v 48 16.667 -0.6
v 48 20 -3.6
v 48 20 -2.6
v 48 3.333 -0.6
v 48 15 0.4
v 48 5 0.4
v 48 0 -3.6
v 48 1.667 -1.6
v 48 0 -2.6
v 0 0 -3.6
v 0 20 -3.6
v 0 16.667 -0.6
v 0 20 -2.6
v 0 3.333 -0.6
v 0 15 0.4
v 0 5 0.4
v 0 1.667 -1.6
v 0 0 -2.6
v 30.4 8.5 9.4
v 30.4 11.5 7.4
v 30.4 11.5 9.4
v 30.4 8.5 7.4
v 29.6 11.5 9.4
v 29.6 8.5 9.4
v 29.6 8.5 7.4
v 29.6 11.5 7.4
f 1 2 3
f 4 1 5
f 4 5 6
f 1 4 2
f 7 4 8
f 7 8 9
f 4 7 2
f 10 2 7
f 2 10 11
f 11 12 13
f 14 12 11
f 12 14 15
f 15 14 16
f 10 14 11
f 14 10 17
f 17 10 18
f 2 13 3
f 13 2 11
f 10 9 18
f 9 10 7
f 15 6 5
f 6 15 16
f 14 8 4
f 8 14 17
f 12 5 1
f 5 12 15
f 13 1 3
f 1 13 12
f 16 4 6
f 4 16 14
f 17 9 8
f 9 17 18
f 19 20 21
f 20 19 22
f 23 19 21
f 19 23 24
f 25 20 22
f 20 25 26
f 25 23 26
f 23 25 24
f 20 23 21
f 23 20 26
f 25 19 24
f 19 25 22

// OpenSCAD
union() {
translate([0,14,-.1]) intersection() {
	rotate([90,0,0]) linear_extrude(8) resize([48,0],auto=true) import ("/Users/rmd/Documents/Patrick.dxf");
	translate([24,-4,6]) linear_extrude(12,scale=[1,.25],center=true) square([48,8],center=true);
}
	translate([0,0,-3.6]) cube([48,20,1]);
//difference() {
	translate([0,10,-1.1])linear_extrude(3,scale=[1,.5],center=true) translate([0,-10]) square([48,20]);
	//translate([5.5,10,-10]) cylinder(r=3,h=10,$fn=20);
	//translate([17,10,-10]) cylinder(r=3,h=10,$fn=20);
	//translate([27,10,-10]) cylinder(r=3,h=10,$fn=20);
	//translate([40,10,-10]) cylinder(r=3,h=10,$fn=20);
//}
translate([29.6,8.5,7.4]) cube([.8,3,2]);
}
